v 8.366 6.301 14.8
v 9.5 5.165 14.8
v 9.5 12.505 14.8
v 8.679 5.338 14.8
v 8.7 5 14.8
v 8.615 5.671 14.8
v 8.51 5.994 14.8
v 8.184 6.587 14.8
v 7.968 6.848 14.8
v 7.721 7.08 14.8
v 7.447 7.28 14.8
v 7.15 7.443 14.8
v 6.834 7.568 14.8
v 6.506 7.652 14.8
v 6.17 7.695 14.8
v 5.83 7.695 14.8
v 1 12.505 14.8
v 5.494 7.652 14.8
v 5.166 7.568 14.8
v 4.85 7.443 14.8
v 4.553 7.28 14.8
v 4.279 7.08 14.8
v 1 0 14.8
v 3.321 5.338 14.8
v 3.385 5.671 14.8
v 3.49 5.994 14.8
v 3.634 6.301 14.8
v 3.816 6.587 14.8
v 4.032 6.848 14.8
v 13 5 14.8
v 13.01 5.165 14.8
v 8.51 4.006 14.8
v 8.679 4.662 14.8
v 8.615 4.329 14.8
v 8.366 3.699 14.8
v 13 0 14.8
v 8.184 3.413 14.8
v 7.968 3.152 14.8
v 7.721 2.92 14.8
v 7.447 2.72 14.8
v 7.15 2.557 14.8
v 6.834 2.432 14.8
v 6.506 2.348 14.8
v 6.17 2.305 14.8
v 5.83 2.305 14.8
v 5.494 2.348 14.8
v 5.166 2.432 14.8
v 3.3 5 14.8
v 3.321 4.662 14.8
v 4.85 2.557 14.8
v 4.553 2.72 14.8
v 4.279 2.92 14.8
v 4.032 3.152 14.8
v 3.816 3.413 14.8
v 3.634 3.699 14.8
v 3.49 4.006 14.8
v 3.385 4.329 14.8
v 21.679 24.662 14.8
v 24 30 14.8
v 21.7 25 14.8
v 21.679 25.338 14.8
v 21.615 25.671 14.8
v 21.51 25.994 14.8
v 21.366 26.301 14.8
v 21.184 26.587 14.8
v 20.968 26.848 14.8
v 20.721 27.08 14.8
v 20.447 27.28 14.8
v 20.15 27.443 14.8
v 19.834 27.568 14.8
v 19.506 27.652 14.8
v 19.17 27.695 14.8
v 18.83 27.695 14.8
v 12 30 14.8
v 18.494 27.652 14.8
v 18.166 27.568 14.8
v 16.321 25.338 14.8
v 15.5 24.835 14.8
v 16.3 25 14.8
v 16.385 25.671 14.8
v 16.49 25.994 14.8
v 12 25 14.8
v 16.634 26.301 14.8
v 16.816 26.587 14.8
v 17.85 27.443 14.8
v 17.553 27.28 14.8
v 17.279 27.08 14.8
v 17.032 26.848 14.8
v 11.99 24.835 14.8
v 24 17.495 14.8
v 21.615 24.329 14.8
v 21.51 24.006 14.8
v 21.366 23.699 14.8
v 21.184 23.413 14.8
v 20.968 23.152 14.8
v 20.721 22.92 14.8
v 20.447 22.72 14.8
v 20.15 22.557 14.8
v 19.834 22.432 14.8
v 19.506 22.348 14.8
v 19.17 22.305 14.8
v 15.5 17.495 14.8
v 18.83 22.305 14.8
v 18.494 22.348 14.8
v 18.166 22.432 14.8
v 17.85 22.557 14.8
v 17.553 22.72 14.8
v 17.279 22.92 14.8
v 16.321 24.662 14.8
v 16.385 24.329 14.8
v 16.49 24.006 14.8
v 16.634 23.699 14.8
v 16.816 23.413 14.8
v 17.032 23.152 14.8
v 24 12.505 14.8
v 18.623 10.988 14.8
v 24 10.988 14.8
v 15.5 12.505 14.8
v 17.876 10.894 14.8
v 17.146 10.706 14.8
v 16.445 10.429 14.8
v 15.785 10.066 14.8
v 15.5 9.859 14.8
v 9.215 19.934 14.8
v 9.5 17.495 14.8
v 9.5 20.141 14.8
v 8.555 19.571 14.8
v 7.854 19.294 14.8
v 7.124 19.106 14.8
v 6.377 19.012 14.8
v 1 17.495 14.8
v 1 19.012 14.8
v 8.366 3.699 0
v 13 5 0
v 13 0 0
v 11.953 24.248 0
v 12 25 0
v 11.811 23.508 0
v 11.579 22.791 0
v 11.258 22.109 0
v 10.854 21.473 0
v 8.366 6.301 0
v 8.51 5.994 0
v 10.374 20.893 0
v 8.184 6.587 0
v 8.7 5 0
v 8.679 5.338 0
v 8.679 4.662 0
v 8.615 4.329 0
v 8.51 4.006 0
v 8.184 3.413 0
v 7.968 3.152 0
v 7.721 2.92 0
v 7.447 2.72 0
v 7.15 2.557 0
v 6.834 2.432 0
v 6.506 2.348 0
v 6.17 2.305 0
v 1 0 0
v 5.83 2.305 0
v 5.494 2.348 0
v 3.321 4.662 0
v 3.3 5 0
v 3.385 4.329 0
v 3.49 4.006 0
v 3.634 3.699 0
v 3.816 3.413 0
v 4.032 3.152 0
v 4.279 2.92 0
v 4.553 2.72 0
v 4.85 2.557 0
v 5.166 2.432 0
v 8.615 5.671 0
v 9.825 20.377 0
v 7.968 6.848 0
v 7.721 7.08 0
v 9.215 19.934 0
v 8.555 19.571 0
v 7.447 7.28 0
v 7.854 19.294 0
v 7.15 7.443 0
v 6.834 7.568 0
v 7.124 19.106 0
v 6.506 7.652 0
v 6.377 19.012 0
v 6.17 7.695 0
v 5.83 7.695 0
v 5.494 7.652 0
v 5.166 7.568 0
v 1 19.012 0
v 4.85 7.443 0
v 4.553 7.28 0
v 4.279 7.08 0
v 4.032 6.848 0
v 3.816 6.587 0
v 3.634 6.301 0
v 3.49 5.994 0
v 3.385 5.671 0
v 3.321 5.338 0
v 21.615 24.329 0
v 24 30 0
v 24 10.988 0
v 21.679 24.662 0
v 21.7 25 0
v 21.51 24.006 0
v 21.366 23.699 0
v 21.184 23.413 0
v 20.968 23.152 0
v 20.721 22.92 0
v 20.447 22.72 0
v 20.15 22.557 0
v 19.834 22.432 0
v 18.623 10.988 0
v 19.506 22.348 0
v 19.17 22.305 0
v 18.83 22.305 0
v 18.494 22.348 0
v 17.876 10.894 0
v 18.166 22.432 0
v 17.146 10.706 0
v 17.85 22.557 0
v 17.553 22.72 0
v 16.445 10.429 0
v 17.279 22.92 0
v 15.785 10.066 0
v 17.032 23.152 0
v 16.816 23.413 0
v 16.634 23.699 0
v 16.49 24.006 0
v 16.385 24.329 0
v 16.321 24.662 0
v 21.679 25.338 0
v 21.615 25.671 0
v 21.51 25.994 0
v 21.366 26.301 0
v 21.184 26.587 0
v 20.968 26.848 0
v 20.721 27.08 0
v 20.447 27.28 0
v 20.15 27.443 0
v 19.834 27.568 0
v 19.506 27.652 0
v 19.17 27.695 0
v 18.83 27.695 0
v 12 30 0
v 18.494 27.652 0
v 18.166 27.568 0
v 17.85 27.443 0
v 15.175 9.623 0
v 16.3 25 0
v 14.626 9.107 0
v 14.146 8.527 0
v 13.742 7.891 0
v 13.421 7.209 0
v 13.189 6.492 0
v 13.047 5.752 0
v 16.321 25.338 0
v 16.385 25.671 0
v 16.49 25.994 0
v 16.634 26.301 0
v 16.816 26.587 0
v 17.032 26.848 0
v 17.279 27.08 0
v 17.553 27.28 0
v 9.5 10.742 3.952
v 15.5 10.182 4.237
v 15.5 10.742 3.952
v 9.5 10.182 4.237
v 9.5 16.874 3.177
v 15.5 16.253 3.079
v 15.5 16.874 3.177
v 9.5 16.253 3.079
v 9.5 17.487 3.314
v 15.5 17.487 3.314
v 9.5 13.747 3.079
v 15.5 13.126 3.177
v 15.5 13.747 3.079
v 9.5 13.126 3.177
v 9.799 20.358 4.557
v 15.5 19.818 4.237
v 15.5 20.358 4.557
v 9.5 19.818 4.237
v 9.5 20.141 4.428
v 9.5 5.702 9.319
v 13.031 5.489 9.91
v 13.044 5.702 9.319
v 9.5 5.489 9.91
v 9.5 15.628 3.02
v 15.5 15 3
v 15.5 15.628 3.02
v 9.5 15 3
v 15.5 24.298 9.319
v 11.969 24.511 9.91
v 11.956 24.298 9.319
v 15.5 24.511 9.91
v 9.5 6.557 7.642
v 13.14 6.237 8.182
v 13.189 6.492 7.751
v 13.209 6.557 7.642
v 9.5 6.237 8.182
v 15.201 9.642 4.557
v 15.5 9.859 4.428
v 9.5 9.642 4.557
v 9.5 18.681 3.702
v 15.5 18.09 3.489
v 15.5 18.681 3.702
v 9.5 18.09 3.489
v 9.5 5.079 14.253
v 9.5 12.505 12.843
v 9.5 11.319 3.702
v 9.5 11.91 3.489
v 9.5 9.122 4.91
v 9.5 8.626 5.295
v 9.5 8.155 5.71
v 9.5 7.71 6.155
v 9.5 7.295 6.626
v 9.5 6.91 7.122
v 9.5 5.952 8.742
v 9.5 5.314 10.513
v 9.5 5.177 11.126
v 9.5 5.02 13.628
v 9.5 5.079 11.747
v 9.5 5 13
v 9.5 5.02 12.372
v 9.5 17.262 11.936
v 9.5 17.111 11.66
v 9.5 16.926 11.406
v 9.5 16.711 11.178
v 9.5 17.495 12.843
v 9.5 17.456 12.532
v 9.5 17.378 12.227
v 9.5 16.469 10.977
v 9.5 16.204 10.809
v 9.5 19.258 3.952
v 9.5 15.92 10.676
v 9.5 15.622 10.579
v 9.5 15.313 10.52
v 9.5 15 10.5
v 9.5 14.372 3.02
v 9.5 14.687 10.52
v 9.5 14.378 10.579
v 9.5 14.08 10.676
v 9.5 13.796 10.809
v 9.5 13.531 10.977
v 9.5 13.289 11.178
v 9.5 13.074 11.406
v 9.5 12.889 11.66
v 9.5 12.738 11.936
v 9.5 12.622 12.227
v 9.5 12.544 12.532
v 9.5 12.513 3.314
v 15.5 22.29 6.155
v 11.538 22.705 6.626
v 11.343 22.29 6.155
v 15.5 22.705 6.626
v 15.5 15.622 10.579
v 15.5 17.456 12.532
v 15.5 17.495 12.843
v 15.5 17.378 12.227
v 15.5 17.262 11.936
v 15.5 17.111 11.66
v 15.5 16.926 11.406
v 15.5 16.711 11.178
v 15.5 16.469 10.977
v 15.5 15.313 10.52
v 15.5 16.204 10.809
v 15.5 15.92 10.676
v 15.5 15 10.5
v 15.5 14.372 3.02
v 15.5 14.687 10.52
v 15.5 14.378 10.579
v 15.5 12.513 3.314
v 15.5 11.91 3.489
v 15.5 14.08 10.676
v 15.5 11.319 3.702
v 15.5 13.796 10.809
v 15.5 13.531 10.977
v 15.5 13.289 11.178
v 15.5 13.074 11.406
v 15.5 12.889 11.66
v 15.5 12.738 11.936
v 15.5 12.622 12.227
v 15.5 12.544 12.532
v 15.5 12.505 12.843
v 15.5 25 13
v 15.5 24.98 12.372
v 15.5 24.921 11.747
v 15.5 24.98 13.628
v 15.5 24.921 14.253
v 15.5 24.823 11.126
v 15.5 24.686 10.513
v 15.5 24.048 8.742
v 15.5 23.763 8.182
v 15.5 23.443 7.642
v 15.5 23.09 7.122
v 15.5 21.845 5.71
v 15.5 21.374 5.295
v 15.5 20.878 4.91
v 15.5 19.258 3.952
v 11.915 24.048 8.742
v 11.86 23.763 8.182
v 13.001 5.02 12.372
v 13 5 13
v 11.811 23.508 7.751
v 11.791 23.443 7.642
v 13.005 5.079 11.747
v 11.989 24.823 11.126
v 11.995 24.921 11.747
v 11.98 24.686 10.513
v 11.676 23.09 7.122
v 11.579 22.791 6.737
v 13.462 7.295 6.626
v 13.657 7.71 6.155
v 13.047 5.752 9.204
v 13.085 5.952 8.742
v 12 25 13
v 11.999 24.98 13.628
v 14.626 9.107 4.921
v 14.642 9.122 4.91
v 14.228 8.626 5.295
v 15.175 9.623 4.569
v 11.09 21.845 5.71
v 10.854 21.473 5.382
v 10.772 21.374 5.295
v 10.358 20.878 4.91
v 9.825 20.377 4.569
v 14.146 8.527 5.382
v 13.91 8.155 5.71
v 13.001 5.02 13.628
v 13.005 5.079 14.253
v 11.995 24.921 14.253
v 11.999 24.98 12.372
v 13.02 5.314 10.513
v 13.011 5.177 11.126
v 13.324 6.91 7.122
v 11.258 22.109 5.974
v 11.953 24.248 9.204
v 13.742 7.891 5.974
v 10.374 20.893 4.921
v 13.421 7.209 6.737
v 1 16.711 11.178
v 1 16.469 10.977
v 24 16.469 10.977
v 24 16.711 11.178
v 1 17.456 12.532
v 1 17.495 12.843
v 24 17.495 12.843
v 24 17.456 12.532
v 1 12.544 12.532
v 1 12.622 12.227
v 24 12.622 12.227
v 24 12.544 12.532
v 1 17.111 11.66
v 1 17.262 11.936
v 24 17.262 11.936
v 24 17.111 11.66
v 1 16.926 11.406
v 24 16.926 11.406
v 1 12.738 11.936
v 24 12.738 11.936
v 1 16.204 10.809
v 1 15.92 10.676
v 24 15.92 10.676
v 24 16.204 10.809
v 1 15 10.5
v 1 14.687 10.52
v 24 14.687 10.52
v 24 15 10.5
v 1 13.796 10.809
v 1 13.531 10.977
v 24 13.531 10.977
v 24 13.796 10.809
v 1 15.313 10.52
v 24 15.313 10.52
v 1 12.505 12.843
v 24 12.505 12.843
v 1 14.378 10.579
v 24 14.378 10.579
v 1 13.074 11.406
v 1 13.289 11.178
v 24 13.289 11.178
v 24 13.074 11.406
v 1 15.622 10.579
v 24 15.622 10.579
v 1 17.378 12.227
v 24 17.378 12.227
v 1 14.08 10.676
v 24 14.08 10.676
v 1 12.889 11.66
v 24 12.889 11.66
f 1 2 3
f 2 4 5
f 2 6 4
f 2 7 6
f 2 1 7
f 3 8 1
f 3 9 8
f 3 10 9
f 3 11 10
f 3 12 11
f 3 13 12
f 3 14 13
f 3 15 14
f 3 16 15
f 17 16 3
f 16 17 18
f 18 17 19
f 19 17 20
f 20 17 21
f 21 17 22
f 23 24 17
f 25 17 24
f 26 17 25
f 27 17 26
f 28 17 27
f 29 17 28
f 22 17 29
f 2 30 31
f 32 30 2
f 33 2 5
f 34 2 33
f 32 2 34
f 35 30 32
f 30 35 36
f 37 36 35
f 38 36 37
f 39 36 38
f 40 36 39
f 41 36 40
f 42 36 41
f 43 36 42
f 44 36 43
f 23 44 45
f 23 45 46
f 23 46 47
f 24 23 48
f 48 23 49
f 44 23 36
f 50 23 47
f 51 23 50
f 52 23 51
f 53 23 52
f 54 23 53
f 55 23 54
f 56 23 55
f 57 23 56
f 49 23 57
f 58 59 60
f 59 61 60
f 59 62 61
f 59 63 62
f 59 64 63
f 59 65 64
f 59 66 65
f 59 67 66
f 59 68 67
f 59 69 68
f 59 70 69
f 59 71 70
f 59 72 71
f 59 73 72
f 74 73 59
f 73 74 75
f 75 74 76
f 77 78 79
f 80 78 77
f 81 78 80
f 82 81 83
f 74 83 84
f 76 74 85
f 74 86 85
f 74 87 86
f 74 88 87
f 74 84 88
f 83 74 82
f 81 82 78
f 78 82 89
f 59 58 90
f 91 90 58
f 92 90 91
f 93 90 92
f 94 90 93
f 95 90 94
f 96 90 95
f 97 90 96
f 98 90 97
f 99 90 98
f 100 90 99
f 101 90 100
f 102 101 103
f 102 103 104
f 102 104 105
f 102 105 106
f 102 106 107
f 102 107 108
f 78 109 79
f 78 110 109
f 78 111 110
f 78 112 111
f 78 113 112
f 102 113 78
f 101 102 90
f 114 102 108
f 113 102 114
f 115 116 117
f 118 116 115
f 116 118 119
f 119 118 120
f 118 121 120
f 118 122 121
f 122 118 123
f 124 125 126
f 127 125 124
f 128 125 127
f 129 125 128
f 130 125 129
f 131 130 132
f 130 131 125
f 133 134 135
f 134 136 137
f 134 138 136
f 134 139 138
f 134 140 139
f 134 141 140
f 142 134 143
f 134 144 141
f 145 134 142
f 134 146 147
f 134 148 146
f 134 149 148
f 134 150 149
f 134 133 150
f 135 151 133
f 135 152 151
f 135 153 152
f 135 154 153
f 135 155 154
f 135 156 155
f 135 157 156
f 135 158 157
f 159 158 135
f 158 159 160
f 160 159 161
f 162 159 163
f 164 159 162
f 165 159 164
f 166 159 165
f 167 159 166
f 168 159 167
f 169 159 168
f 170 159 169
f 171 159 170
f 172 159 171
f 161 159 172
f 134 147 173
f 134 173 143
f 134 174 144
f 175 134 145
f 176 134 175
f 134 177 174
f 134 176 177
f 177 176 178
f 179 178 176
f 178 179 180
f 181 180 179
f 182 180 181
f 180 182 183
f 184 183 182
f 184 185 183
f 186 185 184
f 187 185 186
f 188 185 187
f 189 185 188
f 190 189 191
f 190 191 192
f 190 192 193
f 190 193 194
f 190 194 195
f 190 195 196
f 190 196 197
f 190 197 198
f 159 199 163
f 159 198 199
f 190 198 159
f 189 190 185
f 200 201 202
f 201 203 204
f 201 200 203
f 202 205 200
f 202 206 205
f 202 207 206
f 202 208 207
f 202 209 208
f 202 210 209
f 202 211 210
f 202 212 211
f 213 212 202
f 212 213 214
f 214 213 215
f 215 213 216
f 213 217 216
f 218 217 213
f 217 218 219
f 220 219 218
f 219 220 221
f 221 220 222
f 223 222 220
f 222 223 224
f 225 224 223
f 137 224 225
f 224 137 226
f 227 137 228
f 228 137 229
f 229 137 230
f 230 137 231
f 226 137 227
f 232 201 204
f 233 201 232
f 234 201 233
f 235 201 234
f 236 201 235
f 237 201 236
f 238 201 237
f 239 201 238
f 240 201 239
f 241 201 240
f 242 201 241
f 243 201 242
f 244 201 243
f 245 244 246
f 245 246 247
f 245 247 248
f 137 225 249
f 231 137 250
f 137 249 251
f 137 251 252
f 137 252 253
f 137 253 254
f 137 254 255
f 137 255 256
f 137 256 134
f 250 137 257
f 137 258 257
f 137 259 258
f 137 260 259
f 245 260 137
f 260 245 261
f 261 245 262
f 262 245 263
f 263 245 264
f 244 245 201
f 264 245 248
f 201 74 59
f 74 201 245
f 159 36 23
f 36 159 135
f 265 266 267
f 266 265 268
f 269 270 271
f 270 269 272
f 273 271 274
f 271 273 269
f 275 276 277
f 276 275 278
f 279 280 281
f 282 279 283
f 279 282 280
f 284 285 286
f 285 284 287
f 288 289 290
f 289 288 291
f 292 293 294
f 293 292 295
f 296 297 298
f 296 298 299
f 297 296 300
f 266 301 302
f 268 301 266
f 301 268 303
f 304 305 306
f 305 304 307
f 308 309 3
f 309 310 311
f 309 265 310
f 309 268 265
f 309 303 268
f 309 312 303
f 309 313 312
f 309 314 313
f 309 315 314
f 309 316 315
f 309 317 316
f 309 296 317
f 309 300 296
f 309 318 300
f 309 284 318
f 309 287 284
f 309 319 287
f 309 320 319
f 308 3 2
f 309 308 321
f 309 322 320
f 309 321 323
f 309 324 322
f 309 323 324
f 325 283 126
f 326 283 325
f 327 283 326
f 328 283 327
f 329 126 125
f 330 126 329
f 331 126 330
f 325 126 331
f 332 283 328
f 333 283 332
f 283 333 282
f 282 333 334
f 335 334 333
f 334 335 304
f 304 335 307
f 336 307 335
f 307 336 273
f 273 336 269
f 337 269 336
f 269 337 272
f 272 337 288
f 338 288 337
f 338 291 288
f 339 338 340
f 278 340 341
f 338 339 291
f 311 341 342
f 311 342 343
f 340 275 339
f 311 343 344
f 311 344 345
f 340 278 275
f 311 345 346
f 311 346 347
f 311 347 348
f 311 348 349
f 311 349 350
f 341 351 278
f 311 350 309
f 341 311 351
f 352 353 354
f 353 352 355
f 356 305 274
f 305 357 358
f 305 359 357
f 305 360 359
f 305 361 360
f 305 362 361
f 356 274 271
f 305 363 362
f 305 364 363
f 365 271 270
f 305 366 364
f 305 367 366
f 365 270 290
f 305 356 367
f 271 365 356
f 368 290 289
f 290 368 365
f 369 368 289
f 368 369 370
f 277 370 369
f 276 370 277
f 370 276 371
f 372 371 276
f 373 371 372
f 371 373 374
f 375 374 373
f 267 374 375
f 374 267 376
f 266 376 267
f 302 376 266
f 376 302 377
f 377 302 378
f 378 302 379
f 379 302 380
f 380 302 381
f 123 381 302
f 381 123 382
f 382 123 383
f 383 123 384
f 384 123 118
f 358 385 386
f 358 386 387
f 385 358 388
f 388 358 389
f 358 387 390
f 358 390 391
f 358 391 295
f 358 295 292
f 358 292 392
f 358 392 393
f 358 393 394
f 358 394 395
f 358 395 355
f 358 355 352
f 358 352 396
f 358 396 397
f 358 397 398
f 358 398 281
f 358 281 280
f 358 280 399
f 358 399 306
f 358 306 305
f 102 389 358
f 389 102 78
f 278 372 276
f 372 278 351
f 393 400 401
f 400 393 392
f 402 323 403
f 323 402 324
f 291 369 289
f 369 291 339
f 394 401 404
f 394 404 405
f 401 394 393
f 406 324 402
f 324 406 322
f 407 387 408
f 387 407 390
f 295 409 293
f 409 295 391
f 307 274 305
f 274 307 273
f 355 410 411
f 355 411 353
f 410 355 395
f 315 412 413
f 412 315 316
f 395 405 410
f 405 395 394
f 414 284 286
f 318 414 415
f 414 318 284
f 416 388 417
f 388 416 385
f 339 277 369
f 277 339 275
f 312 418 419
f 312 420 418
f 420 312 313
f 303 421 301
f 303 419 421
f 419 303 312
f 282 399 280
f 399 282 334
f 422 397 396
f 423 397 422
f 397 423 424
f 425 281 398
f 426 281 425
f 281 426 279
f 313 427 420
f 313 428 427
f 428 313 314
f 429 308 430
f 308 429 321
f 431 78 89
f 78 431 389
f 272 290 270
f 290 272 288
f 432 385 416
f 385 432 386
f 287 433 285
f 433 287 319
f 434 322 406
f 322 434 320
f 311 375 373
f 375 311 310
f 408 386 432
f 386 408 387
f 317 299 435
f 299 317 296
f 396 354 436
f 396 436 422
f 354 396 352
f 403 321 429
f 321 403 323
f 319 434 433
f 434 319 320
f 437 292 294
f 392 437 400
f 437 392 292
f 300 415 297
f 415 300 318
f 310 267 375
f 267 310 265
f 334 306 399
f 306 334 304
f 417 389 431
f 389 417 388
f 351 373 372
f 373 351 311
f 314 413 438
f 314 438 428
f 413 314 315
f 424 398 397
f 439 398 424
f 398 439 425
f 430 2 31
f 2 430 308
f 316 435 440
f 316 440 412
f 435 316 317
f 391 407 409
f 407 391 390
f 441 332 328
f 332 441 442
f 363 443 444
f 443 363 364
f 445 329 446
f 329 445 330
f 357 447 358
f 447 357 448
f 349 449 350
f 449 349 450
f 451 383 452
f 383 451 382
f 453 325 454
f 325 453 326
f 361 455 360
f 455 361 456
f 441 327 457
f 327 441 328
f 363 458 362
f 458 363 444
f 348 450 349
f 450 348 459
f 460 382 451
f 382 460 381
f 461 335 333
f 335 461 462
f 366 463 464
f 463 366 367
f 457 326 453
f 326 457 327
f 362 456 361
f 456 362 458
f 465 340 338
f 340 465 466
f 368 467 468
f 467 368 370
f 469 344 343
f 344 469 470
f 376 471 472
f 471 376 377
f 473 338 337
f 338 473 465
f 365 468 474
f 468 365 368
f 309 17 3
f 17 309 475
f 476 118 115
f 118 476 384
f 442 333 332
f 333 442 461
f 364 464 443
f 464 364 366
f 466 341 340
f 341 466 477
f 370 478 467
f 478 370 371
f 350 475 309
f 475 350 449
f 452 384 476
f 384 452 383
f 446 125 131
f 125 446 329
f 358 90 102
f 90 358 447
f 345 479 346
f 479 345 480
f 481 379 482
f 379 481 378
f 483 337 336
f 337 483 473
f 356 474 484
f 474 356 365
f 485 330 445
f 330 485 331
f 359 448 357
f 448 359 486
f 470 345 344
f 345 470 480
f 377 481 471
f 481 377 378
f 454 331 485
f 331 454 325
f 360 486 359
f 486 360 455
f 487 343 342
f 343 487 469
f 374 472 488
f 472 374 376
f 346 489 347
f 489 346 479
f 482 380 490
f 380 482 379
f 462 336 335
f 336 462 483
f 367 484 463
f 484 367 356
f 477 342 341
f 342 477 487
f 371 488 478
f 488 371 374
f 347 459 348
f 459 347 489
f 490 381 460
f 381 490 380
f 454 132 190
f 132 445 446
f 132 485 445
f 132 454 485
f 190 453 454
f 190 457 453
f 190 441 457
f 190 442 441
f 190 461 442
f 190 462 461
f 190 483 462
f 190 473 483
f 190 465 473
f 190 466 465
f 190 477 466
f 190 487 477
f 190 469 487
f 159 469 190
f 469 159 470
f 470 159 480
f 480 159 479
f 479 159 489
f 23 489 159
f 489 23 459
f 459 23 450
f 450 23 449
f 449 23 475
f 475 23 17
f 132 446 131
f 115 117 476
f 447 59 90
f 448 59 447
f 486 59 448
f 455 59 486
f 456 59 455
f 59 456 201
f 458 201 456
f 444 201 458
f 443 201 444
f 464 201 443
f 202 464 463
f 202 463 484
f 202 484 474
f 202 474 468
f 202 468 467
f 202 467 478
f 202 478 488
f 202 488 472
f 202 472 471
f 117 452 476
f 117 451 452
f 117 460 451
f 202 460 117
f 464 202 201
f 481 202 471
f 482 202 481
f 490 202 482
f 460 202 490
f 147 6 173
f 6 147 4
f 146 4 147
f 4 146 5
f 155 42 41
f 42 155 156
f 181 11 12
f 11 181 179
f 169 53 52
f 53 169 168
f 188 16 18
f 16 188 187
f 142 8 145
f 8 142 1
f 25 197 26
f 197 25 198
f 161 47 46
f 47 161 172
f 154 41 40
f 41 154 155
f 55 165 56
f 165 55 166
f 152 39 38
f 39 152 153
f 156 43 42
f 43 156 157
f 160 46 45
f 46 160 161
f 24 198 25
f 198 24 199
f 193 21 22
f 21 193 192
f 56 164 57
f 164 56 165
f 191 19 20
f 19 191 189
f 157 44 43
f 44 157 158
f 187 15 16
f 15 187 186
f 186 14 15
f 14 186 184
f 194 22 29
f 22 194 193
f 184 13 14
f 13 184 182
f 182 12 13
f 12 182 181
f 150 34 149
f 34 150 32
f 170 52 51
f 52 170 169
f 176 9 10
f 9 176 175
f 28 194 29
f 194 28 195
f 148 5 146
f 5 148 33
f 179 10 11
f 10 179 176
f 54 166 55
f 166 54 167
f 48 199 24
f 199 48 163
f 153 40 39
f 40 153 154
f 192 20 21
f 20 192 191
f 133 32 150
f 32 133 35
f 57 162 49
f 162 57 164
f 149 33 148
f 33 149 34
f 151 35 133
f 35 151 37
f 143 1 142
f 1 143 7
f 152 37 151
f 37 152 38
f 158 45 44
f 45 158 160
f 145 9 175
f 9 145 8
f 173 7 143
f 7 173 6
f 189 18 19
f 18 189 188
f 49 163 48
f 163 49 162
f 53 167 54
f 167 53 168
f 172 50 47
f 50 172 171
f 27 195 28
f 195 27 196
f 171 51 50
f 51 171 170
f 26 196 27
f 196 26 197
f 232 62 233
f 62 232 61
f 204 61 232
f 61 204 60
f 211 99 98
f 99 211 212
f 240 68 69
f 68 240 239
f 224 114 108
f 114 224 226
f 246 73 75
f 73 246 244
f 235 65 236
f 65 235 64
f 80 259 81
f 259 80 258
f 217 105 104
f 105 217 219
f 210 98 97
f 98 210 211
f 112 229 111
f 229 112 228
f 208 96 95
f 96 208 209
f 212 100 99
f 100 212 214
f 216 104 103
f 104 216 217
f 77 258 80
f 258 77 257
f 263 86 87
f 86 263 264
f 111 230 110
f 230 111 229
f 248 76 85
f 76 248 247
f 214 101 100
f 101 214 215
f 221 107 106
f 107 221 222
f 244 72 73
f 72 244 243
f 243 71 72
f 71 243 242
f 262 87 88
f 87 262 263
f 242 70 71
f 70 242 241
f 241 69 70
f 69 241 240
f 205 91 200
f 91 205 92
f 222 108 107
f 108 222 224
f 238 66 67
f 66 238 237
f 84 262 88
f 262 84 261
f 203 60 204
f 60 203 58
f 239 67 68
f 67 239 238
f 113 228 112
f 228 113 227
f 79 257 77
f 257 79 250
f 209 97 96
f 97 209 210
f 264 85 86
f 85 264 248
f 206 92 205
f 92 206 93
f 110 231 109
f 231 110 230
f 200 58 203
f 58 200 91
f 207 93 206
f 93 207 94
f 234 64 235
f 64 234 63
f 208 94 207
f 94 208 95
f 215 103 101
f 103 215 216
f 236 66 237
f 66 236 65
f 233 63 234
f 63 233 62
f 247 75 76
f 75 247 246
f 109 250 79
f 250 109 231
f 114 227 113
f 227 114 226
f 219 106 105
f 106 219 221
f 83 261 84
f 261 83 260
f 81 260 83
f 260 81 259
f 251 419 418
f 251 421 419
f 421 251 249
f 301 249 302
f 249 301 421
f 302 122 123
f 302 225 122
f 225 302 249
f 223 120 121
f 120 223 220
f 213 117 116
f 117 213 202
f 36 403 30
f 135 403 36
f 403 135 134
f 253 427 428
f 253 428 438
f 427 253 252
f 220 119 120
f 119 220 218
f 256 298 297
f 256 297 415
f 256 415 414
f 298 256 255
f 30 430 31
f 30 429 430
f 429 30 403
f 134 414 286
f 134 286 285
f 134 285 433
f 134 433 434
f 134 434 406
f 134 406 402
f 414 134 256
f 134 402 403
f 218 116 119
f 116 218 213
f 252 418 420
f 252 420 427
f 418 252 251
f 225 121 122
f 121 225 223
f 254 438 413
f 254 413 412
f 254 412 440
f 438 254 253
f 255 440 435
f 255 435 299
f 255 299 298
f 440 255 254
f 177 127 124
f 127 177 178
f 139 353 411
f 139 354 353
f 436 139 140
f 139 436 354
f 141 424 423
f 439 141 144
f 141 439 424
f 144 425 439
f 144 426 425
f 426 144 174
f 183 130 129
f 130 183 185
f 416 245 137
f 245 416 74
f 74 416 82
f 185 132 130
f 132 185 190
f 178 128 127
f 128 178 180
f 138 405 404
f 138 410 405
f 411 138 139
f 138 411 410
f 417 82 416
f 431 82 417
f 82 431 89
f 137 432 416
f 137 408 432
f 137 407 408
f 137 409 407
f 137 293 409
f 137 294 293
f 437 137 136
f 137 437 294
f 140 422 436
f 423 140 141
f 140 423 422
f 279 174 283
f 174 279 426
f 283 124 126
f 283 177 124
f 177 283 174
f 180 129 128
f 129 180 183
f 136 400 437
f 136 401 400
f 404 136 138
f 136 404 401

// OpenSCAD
largeur=70;
ep=25;
hauteur=60;
r_filament=1.85;
r_m3=2;
ecrou_m3=3.2;
ecart_pignon=4+1.1;
ecart_605=7+1.5;

long_605=30;
ep_605=10;
r_m5=2.9;
r_ecrou_m5=4.6;
r_tube=3.1;

surep=3; //surépaisseur pour les supports 605 par rapport à la version initiale, pour les rendre plus solides
epde=23; //ajout en hauteur pour le bloc extrudeur afin de pouvoir sur monter sur les chariots inversés sur les Tobeca sur mesure

module double_extrudeur(){
	difference(){
	union(){
		cube([largeur,hauteur,ep]);
		translate([0,-epde,0]){cube([largeur,epde,ep]);}
	}

		//trous généraux pour passage filament
		translate([17.7,-50,ep/2]){rotate([-90,0,0])cylinder(r=r_filament, h=150, $fn=50);}
		translate([52.3,-50,ep/2]){rotate([-90,0,0])cylinder(r=r_filament, h=150, $fn=50);}
		

		//lamage pour supporter les tubes en teflon
		translate([17.7,hauteur+5,ep/2]){rotate([90,0,0])cylinder(r=r_tube, h=10, $fn=50);}
		translate([52.3,hauteur+5,ep/2]){rotate([90,0,0])cylinder(r=r_tube, h=10, $fn=50);}
		translate([17.7,hauteur-4.99,ep/2]){rotate([90,0,0])cylinder(r1=r_tube, r2=r_filament, h=4, $fn=100);}
		translate([52.3,hauteur-4.99,ep/2]){rotate([90,0,0])cylinder(r1=r_tube, r2=r_filament,h=4, $fn=100);}

		//trous de fixation sur plaque alu
		translate([5,-50,ep/2]){rotate([-90,0,0])cylinder(r=r_m3, h=100, $fn=50);}
		translate([largeur-5,-50,ep/2]){rotate([-90,0,0])cylinder(r=r_m3, h=100, $fn=50);}
		translate([5,10-4,ep/2]){rotate([-90,30,0])cylinder(r=ecrou_m3, h=5, $fn=6);}
		translate([largeur-5,10-4,ep/2]){rotate([-90,30,0])cylinder(r=ecrou_m3, h=5, $fn=6);}

		//trous pour fixation des moteurs gauche
		translate([17.7+ecart_pignon,10,-5]){cylinder(r=r_m3, h=ep+10, $fn=50);}
		translate([17.7+ecart_pignon,10+44.55,-5]){cylinder(r=r_m3, h=ep+10, $fn=50);}

		translate([17.7+ecart_pignon,10,ep-9]){cylinder(r=4, h=10, $fn=50);}
		translate([17.7+ecart_pignon,10+44.55,ep-9]){cylinder(r=4, h=10, $fn=50);}

		//trous pour fixation des moteurs droite
		translate([52.3-ecart_pignon,10,-5]){cylinder(r=r_m3, h=ep+10, $fn=50);}
		translate([52.3-ecart_pignon,10+44.55,-5]){cylinder(r=r_m3, h=ep+10, $fn=50);}

		translate([52.3-ecart_pignon,10,-0.1]){cylinder(r=4, h=9, $fn=50);}
		translate([52.3-ecart_pignon,10+44.55,-0.1]){cylinder(r=4, h=9, $fn=50);}

		//extrusions pour encastrement bloc moteur et pignon gauche
		translate([52.3-ecart_pignon,10+44.55/2,-5]){cylinder(r=5, h=ep+10, $fn=100);}
		translate([52.3-ecart_pignon,10+44.55/2,ep-3]){cylinder(r=11.2, h=ep, $fn=100);}
		translate([52.3-ecart_pignon,10+44.55/2,ep-10]){cylinder(r=7, h=ep, $fn=100);}

		//extrusions pour encastrement bloc moteur et pignon droite
		translate([17.7+ecart_pignon,10+44.55/2,-5]){cylinder(r=5, h=ep+10, $fn=100);}
		translate([17.7+ecart_pignon,10+44.55/2,-0.01]){cylinder(r=7, h=9, $fn=100);}
		translate([17.7+ecart_pignon,10+44.55/2,8.98]){cylinder(r1=7, r2=5, h=1, $fn=100);}
		translate([17.7+ecart_pignon,10+44.55/2,-0.01]){cylinder(r=11.2, h=3, $fn=100);}
		translate([17.7+ecart_pignon,10+44.55/2,2.98]){cylinder(r1=11.2, r2=7, h=2, $fn=100);}
		
		
		//trous pour roulements 605ZZ
		hull(){
			translate([17.7-ecart_605,10+44.55/2,-5]){cylinder(r=7.5, h=ep+10, $fn=100);}
			translate([17.7-ecart_605+10,10+44.55/2,-5]){cylinder(r=5, h=ep+10, $fn=100);}
		}

		hull(){
			translate([52.3+ecart_605,10+44.55/2,-5]){cylinder(r=7.5, h=ep+10, $fn=100);}
			translate([52.3+ecart_605-10,10+44.55/2,-5]){cylinder(r=5, h=ep+10, $fn=100);}
		}
		
		

		//extrusions pour libérer les roulements
		translate([-5,10,-5]){cube([17.7-ecart_605+5,hauteur,ep+10]);}
		translate([52.3+ecart_605,10,-5]){cube([17.7-ecart_605+5,hauteur,ep+10]);}

		//extrusion haute pour alléger la pièce
		hull(){
			translate([largeur/2,hauteur/2+20,-5]){cylinder(r=4, h=ep+10, $fn=100);}
			translate([largeur/2,hauteur+20,-5]){cylinder(r=10, h=ep+10, $fn=100);}
		}


		//extrusions pour bloquer les têtes
		translate([17.7,-epde-5,ep/2]){rotate([-90,0,0])cylinder(r=5, h=12, $fn=100);}
		translate([17.7,-epde-5,ep/2]){rotate([-90,0,0])cylinder(r=8.5, h=9, $fn=100);}
		translate([52.3,-epde-5,ep/2]){rotate([-90,0,0])cylinder(r=5, h=12, $fn=100);}
		translate([52.3,-epde-5,ep/2]){rotate([-90,0,0])cylinder(r=8.5, h=9, $fn=100);}

		//trous traversants pour serrer les ressorts
		translate([-5,10+44.55/2-15+5,6]){rotate([0,90,0])cylinder(r=r_m5, h=100, $fn=50);}
		//translate([-5,10+44.55/2-15+5,6]){rotate([0,90,0])cylinder(r=r_m5+0.5, h=44, $fn=50);}
		

		translate([-5,10+44.55/2-15+5,ep-6]){rotate([0,90,0])cylinder(r=r_m5, h=100, $fn=50);}
		//translate([31,10+44.55/2-15+5,ep-6]){rotate([0,90,0])cylinder(r=r_m5+0.5, h=100, $fn=50);}
		

		translate([-5,10+44.55/2-15+long_605-5,6]){rotate([0,90,0])cylinder(r=r_m5, h=100, $fn=50);}
		//translate([-5,10+44.55/2-15+long_605-5,6]){rotate([0,90,0])cylinder(r=r_m5+0.5, h=40, $fn=50);}
		

		translate([-5,10+44.55/2-15+long_605-5,ep-6]){rotate([0,90,0])cylinder(r=r_m5, h=100, $fn=50);}
		//translate([31,10+44.55/2-15+long_605-5,ep-6]){rotate([0,90,0])cylinder(r=r_m5+0.5, h=100, $fn=50);}

		//extrusions pour alléger les côtés de la pièce
		hull(){
			translate([10,15,-5]){cylinder(r=5, h=ep+10, $fn=50);}
			translate([10,hauteur-10,-5]){cylinder(r=5, h=ep+10, $fn=50);}
		}

		hull(){
			translate([largeur-10,15,-5]){cylinder(r=5, h=ep+10, $fn=50);}
			translate([largeur-10,hauteur-10,-5]){cylinder(r=5, h=ep+10, $fn=50);}
		}

		//rainures pour le passage de la courroie
		hull(){
		translate([-5,-epde+14,ep-2]){rotate([0,90,0])cylinder(r=7, h=100, $fn=50);}
		translate([-5,-epde+14,ep+7]){rotate([0,90,0])cylinder(r=12, h=100, $fn=50);}
		}

		hull(){
		translate([-5,-epde+14,-7]){rotate([0,90,0])cylinder(r=12, h=largeur/2-1.5, $fn=50);}
		translate([-5,-epde+14,2]){rotate([0,90,0])cylinder(r=7, h=largeur/2-1.5, $fn=50);}
		}

		hull(){
		translate([largeur/2+6.5,-epde+14,-7]){rotate([0,90,0])cylinder(r=12, h=100, $fn=50);}
		translate([largeur/2+6.5,-epde+14,2]){rotate([0,90,0])cylinder(r=7, h=100, $fn=50);}
		}

		//passage de vis pour tenir la courroie
		translate([largeur/2-13,-epde+14,-5]){cylinder(r=r_m3, h=100, $fn=50);}
		translate([largeur/2+13,-epde+14,-5]){cylinder(r=r_m3, h=100, $fn=50);}
		translate([largeur/2-13,-epde+14,0]){cylinder(r=ecrou_m3, h=13, $fn=6);}
		translate([largeur/2+13,-epde+14,0]){cylinder(r=ecrou_m3, h=13, $fn=6);}

		

	}
}

module support_605(){
	difference(){
		cube([ep,long_605,ep_605+1.8+surep]);

		//extrusion pour passage roulement
		//translate([ep/2-3,-8,-5]){cube([6,16,10+10]);}
		translate([ep/2-3,long_605/2,ep_605+surep]){rotate([0,90,0])cylinder(r=10, h=6, $fn=100);}

		//passage d'axe
		hull(){
			translate([-5,15,ep_605+surep]){rotate([0,90,0])cylinder(r=2.5, h=ep+10, $fn=50);}
			translate([-5,15,ep_605+5+surep]){rotate([0,90,0])cylinder(r=2.5, h=ep+10, $fn=50);}
		}
		

		//extrusion pour libérer un peu le bloc
		//translate([-5,long_605/2+6,ep_605-3+surep]){cube([ep+10,20,5]);}
		//translate([-5,-5,ep_605-3+surep]){cube([ep+10,5+long_605/2-6,5]);}

		//extrusion pour enlever un peu de largeur à la partie montante
		translate([-0.1,0,ep_605-3+surep]){cube([1.1,30,5]);}
		translate([ep-1,0,ep_605-3+surep]){cube([10,30,5]);}

		//trous pour serrage
		translate([6,5,-5]){cylinder(r=2.7, h=ep+10, $fn=50);}
		translate([ep-6,long_605-5,-5]){cylinder(r=2.7, h=ep+10, $fn=50);}

		//trous libres pour support_605g
		hull(){
			translate([ep-6,5,-5]){cylinder(r=6, h=ep+10, $fn=50);}
			translate([ep-6+5,5,-5]){cylinder(r=6, h=ep+10, $fn=50);}
			translate([ep-6,0,-5]){cylinder(r=6, h=ep+10, $fn=50);}
		}

		hull(){
			translate([6,long_605-5,-5]){cylinder(r=6, h=ep+10, $fn=50);}
			translate([6-5,long_605-5,-5]){cylinder(r=6, h=ep+10, $fn=50);}
			translate([6,long_605,-5]){cylinder(r=6, h=ep+10, $fn=50);}
		}

		

		//rognage sur les bords pour ne pas frotter sur les blocs moteurs
		translate([-1,-5,-5]){cube([2,long_605+10,ep_605+10]);}
		translate([ep-1,-5,-5]){cube([2,long_605+10,ep_605+10]);}

	}

}



//double_extrudeur();
//translate([-surep,10+44.55/2-15,ep]){rotate([0,90,0])support_605();}
//translate([largeur+surep,10+44.55/2-15,0]){rotate([0,-90,0])support_605();}

//translate([100,0,0]){support_605();}
support_605();
